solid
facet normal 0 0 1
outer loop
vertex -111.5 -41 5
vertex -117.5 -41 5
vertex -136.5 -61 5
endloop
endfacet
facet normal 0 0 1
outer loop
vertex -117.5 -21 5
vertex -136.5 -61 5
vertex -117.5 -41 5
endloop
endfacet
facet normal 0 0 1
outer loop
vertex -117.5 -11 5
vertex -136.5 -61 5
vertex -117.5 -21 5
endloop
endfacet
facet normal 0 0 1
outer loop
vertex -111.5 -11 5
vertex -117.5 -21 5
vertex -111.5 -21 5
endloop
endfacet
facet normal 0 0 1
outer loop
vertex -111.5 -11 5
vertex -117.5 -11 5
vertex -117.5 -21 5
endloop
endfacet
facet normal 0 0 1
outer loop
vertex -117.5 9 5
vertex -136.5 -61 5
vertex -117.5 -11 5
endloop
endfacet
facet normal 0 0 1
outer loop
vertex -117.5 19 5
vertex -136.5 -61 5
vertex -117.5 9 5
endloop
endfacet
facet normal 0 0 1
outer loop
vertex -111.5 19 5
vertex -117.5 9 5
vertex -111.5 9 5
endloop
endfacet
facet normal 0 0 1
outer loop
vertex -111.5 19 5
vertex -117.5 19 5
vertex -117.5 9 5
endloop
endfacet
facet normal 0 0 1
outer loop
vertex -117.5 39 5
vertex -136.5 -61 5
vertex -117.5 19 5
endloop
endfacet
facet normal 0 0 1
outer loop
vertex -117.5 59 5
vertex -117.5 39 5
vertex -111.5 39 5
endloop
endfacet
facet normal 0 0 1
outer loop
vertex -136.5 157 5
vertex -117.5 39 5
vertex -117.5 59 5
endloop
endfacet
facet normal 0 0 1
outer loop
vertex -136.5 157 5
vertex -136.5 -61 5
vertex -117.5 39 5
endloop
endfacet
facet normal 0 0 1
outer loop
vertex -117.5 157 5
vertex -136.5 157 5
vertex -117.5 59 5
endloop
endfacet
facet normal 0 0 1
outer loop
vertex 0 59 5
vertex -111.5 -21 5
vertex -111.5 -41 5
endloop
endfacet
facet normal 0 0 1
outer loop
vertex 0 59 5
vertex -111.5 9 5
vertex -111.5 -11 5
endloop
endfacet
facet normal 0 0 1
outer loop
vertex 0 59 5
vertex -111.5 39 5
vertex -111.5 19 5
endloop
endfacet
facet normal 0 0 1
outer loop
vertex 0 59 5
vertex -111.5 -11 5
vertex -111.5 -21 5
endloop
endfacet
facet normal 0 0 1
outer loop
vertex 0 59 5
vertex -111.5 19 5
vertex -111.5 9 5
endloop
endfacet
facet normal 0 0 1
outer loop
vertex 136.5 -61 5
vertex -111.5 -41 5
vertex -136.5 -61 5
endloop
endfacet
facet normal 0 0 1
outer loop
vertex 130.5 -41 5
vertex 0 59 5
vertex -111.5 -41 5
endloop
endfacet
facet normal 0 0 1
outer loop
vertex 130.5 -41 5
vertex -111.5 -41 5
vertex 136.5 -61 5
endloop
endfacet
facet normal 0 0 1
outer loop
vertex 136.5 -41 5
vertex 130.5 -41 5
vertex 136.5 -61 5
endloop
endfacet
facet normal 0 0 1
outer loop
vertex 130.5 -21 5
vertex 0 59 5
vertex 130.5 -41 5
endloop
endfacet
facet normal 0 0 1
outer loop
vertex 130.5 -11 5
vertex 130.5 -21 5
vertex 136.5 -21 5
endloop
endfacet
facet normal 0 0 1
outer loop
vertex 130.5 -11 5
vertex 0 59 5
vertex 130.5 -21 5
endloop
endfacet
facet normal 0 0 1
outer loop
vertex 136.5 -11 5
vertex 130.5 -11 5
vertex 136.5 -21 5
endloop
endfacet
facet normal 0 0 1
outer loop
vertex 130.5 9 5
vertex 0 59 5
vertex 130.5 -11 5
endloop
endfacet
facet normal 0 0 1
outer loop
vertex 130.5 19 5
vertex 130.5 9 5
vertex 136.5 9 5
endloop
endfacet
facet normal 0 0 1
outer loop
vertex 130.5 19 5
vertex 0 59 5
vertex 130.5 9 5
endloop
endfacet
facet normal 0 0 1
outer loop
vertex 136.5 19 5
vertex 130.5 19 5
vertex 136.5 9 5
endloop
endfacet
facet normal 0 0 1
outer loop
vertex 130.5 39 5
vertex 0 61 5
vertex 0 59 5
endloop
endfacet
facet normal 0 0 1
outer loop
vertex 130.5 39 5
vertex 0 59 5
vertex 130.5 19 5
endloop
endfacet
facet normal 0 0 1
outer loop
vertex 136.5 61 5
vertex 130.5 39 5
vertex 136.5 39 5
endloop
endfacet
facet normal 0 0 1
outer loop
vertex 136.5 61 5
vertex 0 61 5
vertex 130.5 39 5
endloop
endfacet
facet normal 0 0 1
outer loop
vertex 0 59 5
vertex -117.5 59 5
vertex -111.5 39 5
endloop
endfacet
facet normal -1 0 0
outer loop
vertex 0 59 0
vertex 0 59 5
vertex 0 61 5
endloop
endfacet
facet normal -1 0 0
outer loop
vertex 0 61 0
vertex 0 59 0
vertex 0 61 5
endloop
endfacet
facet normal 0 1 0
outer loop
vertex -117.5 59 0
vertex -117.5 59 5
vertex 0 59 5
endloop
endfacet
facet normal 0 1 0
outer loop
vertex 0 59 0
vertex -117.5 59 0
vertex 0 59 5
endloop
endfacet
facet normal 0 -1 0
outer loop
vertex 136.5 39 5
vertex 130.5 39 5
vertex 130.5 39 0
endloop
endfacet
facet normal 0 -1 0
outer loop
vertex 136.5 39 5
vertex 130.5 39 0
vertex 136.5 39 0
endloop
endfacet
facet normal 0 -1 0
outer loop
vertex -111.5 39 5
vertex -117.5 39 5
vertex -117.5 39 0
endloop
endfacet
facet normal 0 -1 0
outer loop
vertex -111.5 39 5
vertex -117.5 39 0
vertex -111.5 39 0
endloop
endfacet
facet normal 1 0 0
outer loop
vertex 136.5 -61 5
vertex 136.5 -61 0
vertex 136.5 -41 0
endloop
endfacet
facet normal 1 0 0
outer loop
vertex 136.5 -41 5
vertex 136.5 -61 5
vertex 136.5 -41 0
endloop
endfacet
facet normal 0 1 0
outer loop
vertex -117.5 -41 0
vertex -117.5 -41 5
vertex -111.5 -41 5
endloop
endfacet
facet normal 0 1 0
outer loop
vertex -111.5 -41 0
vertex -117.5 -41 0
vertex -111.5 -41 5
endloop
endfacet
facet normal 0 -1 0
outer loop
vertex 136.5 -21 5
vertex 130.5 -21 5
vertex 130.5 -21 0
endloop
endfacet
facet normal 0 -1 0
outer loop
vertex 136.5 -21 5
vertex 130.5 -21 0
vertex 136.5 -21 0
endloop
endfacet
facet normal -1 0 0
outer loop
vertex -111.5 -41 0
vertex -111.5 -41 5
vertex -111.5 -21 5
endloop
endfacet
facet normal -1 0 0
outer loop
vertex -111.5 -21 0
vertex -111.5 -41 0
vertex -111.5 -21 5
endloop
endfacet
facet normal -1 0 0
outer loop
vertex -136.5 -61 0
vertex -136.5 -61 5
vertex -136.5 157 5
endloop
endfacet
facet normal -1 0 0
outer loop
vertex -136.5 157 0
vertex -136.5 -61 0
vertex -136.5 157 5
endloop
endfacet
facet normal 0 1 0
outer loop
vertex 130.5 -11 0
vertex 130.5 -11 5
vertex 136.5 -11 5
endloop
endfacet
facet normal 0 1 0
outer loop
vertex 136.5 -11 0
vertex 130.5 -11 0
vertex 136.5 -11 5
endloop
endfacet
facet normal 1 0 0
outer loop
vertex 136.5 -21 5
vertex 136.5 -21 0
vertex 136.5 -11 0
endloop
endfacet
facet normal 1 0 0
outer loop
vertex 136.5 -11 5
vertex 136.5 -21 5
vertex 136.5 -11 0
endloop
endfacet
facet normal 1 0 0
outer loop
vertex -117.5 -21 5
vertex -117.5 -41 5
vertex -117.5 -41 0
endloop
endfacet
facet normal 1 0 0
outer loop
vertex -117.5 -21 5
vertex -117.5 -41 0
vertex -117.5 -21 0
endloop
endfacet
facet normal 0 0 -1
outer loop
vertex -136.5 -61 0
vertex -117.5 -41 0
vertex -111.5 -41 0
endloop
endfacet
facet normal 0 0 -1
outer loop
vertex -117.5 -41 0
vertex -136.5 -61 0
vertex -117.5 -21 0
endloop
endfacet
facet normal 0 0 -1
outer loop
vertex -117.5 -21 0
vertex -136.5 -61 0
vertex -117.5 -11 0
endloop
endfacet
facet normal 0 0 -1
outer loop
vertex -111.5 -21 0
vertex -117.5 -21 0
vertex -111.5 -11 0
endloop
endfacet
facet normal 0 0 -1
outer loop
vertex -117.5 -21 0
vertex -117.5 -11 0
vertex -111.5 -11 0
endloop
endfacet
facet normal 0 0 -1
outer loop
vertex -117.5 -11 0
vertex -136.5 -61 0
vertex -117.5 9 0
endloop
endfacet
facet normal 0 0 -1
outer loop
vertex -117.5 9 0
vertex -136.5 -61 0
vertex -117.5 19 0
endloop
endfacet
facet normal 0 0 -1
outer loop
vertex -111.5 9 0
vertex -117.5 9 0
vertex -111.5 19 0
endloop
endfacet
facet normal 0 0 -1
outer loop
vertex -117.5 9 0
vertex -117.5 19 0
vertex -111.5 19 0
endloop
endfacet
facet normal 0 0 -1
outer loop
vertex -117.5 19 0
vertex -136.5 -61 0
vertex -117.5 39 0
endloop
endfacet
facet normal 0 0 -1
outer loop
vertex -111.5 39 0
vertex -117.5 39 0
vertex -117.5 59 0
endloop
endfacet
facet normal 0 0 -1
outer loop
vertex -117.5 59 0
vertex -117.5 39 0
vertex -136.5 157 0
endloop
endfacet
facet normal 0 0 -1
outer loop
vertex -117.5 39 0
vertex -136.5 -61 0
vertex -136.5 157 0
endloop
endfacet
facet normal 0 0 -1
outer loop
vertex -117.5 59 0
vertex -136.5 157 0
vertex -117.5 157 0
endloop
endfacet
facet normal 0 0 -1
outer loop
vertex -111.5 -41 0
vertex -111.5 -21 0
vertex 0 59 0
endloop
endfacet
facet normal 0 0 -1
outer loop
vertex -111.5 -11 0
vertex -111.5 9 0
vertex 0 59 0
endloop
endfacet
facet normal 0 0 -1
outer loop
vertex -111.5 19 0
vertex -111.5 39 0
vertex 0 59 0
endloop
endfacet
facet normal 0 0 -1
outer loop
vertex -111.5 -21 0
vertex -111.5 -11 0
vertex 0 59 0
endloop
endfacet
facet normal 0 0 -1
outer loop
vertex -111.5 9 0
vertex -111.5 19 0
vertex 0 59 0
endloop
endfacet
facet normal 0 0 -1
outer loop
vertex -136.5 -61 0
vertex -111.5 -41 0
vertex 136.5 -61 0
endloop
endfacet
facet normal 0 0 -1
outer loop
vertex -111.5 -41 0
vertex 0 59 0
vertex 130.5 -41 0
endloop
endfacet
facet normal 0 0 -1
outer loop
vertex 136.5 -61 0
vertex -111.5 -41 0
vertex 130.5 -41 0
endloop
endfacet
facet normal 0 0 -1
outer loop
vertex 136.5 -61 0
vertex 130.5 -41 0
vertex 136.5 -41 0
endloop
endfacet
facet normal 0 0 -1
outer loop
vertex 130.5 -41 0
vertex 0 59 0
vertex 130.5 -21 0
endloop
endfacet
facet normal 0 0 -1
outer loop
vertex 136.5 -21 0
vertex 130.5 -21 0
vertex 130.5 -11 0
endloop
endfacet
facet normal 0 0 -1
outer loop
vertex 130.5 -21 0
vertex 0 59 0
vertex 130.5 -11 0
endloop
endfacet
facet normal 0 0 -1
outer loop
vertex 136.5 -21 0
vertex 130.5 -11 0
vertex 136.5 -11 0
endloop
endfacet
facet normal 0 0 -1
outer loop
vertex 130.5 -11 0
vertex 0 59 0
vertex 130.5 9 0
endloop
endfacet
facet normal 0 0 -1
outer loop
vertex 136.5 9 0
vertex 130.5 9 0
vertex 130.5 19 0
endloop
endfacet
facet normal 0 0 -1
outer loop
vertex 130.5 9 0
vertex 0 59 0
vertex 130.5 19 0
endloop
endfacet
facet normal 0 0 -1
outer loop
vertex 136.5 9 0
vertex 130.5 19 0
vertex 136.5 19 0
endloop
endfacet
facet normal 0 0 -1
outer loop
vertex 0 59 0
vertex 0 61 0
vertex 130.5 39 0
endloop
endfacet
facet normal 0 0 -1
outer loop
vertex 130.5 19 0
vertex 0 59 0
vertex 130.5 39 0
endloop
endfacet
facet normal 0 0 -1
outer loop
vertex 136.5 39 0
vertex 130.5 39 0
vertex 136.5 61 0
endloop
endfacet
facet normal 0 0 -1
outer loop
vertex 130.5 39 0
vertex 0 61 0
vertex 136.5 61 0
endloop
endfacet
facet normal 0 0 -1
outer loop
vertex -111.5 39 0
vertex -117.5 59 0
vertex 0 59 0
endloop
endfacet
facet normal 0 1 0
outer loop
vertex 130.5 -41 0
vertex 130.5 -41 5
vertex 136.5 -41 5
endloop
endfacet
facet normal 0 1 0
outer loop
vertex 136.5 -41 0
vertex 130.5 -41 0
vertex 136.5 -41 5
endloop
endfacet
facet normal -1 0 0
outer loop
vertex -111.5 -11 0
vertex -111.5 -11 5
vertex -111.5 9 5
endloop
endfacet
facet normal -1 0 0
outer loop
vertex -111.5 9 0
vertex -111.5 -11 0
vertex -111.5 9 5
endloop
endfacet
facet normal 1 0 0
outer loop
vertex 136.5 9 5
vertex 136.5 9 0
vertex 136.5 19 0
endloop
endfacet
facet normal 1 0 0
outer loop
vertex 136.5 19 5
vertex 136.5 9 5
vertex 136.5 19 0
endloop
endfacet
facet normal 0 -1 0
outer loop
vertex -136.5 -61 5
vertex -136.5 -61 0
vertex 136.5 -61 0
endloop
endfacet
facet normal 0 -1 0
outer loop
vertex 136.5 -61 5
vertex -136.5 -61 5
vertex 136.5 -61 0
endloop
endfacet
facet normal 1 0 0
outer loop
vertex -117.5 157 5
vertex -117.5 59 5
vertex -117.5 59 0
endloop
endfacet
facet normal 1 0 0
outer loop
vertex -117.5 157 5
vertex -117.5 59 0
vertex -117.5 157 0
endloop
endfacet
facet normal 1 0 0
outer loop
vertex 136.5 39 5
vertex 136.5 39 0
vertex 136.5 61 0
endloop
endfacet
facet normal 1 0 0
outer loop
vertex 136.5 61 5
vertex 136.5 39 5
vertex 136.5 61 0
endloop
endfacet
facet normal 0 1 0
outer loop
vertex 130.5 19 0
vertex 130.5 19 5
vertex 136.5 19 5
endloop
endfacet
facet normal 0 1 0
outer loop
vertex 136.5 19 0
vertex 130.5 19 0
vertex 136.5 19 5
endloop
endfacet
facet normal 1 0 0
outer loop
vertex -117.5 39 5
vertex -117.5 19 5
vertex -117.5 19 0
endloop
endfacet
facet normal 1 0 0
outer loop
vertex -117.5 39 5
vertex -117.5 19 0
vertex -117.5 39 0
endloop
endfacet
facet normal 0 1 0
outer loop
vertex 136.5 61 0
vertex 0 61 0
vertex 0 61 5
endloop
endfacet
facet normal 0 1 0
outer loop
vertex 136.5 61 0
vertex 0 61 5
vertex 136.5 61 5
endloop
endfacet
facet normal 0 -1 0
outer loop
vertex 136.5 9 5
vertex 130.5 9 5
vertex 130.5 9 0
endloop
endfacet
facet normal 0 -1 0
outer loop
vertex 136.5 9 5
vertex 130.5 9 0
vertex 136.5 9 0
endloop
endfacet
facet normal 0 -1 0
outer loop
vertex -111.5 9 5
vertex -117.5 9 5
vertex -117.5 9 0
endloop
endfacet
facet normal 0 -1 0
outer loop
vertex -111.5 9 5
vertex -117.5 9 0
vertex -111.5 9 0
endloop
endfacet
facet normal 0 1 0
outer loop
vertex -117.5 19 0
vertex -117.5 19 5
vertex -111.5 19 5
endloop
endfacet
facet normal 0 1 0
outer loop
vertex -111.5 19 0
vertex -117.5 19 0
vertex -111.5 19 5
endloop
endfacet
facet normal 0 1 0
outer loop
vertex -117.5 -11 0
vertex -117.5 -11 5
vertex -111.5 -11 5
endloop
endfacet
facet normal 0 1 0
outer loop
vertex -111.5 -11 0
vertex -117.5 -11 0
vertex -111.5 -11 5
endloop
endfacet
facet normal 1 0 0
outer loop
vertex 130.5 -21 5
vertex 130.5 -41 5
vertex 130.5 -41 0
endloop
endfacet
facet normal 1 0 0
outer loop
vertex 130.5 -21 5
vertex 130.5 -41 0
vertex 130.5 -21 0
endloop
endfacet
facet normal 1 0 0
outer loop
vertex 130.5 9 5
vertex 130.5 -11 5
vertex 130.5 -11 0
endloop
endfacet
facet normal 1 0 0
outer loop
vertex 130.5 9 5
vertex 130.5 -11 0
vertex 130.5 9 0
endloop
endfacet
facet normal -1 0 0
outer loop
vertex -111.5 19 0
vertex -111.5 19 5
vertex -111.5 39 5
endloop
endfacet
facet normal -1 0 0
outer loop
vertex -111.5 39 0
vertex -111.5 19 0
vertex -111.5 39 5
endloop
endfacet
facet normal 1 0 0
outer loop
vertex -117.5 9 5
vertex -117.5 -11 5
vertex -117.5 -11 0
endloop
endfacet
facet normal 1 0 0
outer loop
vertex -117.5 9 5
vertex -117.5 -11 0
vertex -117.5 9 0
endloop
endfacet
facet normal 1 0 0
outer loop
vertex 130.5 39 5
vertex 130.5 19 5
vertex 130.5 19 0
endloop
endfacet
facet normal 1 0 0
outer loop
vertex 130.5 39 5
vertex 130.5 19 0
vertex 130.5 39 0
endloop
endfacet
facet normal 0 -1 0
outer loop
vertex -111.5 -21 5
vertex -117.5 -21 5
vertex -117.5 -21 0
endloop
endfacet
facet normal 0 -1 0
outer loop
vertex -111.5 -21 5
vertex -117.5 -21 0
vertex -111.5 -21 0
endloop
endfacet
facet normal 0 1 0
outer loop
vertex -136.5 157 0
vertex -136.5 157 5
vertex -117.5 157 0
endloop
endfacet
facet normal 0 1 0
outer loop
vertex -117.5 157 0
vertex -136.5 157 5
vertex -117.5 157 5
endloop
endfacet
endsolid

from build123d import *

# Parameters (mm, degrees)
SKETCH1_W           = 273
SKETCH1_H           = 122
BOSS_EXTRUDE1_DEPTH = 5
SKETCH2_W           = 19
SKETCH2_H           = 96
BOSS_EXTRUDE2_DEPTH = 5
SKETCH3_W           = 6
SKETCH3_H           = 20
CUT_EXTRUDE1_DEPTH  = 6
SKETCH6_W           = 117.5
SKETCH6_H           = 2
CUT_EXTRUDE3_DEPTH  = 6


with BuildPart() as part:
    # Sketch1 → Boss-Extrude1 (new body)
    with BuildSketch(Plane.XY):
        Rectangle(SKETCH1_W, SKETCH1_H)
    extrude(amount=BOSS_EXTRUDE1_DEPTH)

    # Sketch2 → Boss-Extrude2 (add)
    with BuildSketch(Plane.XY.offset(5)):
        with Locations((-127, 109)):
            Rectangle(SKETCH2_W, SKETCH2_H)
    extrude(amount=-BOSS_EXTRUDE2_DEPTH)

    # Sketch3 → Cut-Extrude1 (cut)
    with BuildSketch(Plane.XY.offset(5)):
        with Locations((-114.5, 29)):
            Rectangle(SKETCH3_W, SKETCH3_H)
        with Locations((-114.5, -1)):
            Rectangle(SKETCH3_W, SKETCH3_H)
        with Locations((-114.5, -31)):
            Rectangle(SKETCH3_W, SKETCH3_H)
        with Locations((133.5, 29)):
            Rectangle(SKETCH3_W, SKETCH3_H)
        with Locations((133.5, -1)):
            Rectangle(SKETCH3_W, SKETCH3_H)
        with Locations((133.5, -31)):
            Rectangle(SKETCH3_W, SKETCH3_H)
    extrude(amount=-CUT_EXTRUDE1_DEPTH, mode=Mode.SUBTRACT)

    # Sketch6 → Cut-Extrude3 (cut)
    with BuildSketch(Plane.XY.offset(5)):
        with Locations((-58.75, 60)):
            Rectangle(SKETCH6_W, SKETCH6_H)
    extrude(amount=-CUT_EXTRUDE3_DEPTH, mode=Mode.SUBTRACT)


solid = part.part
